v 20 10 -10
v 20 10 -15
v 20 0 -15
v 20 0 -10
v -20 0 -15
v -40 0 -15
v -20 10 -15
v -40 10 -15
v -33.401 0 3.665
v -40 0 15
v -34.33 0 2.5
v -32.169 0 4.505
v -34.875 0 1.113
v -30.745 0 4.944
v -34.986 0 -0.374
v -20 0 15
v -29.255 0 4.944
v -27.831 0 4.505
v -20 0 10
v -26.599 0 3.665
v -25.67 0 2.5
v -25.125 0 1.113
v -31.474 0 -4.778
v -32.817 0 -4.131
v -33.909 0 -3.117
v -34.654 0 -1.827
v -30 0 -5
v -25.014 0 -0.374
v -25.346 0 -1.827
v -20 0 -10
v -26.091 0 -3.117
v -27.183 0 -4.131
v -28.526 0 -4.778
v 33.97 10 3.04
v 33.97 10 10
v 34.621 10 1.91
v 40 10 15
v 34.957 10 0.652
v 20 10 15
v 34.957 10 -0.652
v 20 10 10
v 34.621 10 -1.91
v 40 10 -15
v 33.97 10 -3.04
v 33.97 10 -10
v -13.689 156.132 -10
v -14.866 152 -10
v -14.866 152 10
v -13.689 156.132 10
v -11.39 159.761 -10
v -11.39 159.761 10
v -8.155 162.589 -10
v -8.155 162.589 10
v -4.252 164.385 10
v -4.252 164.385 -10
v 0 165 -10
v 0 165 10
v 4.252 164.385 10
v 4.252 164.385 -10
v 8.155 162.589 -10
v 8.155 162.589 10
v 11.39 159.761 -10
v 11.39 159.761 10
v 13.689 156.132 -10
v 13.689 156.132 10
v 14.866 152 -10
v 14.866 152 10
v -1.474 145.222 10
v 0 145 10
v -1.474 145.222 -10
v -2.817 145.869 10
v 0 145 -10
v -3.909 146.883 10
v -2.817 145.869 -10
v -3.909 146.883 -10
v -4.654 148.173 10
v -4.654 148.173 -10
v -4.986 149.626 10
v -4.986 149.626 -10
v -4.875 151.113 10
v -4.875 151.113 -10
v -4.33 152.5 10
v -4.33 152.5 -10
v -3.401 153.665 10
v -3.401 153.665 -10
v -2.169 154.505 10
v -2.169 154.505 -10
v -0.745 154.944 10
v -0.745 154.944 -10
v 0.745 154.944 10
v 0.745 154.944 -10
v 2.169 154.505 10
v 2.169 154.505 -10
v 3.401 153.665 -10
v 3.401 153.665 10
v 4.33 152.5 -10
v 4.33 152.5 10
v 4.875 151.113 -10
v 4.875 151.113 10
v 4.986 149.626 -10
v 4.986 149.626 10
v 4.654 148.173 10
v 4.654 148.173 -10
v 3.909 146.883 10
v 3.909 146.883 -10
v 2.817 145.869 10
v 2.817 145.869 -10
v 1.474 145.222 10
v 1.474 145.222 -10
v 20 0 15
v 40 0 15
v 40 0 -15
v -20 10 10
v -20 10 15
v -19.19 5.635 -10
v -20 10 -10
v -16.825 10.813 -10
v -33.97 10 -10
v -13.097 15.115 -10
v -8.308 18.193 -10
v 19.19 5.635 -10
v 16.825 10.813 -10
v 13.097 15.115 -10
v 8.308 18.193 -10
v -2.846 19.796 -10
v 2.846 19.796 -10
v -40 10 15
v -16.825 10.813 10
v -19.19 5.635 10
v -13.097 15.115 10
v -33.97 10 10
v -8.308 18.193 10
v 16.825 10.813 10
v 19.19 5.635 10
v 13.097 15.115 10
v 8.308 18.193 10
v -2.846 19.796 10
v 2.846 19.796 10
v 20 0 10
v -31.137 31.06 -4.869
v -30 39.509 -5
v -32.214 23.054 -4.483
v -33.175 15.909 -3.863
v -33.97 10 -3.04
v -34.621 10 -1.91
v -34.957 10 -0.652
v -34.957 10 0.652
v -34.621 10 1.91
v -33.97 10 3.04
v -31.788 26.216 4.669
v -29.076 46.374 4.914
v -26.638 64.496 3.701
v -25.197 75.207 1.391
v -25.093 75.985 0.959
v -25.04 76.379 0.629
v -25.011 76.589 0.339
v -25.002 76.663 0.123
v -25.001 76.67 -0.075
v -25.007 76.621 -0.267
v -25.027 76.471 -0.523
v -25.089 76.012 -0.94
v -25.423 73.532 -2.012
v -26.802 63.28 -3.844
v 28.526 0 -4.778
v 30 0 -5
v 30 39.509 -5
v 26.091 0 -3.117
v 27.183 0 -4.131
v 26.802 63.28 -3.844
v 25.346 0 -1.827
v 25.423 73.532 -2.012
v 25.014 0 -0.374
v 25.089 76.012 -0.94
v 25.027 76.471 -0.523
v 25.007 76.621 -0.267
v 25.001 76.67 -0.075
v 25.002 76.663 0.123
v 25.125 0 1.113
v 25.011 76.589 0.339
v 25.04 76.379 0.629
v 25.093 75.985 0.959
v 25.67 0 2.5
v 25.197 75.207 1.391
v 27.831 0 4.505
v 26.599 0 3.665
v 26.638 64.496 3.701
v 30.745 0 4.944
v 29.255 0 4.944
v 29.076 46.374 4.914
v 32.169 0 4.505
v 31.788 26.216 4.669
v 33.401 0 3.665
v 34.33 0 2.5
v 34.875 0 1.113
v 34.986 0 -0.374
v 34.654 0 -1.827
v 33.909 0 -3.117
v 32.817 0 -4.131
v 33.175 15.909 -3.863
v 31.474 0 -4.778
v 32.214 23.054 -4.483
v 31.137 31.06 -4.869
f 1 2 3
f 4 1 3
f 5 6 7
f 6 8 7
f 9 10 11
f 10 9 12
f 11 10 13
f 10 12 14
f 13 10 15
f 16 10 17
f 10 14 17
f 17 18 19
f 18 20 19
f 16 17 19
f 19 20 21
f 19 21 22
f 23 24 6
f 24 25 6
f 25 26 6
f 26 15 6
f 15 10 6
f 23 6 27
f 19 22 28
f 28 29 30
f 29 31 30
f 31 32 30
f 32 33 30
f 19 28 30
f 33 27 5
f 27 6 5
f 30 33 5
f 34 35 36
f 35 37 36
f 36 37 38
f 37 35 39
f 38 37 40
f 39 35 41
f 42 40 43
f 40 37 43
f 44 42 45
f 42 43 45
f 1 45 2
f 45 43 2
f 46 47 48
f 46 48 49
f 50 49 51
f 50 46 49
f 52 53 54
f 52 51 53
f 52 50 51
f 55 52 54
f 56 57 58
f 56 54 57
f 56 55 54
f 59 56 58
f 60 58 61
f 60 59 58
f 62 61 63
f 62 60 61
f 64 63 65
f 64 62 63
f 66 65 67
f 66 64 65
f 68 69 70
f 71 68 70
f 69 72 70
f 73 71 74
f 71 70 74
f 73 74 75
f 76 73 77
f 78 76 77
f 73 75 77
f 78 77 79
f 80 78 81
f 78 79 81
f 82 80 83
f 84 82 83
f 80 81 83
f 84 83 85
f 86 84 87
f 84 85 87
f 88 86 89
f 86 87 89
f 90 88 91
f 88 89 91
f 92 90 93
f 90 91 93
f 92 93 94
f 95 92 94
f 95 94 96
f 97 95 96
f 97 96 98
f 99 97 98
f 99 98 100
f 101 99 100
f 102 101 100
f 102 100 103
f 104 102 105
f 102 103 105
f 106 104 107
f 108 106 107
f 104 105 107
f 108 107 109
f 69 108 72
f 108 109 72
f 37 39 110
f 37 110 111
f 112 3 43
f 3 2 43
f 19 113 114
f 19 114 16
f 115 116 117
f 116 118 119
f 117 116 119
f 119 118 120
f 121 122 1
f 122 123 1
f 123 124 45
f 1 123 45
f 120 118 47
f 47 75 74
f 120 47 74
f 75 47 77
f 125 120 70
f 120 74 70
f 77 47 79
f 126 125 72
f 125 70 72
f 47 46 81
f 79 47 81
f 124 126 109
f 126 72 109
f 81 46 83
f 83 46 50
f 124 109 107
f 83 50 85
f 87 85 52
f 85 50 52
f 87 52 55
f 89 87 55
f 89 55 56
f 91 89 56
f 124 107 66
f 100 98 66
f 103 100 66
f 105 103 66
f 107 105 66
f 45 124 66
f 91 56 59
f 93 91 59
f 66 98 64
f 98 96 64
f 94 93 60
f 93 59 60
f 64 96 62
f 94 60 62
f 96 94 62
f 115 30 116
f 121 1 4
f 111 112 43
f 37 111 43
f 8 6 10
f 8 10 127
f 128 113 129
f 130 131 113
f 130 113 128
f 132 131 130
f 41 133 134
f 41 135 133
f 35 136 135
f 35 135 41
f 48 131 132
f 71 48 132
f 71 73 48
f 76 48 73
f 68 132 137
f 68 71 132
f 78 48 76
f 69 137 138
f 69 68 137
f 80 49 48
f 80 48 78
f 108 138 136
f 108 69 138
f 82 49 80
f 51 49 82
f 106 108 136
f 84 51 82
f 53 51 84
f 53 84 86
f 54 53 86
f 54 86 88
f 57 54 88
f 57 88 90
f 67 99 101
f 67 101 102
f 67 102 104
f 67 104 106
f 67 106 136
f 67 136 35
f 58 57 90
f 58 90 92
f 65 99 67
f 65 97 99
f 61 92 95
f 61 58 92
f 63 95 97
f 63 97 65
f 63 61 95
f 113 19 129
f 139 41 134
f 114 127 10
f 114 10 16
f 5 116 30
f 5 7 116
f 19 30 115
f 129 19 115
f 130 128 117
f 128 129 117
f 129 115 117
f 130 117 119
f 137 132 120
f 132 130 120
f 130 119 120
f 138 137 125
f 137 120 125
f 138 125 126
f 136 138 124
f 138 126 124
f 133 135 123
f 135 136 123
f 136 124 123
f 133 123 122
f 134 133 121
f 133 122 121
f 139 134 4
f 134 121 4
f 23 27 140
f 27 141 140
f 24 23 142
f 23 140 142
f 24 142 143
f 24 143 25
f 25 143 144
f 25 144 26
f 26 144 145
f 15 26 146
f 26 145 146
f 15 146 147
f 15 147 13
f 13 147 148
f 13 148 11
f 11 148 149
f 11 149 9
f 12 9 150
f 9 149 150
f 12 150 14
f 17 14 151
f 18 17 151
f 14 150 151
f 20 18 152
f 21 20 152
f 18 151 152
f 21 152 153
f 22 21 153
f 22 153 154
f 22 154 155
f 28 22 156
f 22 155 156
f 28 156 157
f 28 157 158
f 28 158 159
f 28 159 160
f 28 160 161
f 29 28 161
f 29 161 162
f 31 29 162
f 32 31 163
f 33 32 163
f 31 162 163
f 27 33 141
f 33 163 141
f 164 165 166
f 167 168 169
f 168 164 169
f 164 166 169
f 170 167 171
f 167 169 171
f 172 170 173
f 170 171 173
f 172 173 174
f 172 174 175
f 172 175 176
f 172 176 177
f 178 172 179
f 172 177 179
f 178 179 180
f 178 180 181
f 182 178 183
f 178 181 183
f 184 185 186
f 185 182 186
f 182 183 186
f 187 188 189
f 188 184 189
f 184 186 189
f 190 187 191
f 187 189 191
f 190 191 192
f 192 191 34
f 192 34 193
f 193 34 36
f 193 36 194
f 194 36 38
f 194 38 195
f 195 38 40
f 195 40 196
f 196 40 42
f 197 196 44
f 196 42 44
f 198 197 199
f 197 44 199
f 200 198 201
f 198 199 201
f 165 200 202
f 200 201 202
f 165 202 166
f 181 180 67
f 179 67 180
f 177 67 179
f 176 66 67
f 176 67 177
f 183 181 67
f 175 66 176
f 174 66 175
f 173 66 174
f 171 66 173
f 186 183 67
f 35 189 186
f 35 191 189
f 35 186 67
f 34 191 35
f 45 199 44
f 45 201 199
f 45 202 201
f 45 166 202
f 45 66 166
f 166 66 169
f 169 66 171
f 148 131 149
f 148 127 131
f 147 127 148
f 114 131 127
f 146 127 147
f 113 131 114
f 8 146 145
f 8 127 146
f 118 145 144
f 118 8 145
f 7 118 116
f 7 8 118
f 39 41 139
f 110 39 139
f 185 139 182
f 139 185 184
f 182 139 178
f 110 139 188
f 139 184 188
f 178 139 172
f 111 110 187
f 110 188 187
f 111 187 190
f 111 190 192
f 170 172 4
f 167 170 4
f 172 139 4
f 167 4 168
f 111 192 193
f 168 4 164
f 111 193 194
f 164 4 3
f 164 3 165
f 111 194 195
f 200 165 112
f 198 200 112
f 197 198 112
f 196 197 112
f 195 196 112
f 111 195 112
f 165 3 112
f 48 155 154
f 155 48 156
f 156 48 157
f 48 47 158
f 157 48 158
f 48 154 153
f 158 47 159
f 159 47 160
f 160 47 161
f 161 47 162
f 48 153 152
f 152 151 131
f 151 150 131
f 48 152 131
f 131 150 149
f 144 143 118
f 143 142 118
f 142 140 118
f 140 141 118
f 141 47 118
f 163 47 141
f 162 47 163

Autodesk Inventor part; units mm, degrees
ref_plane "YZ Plane" through (0, 0, 0) normal (1, 0, 0) x (0, 1, 0)
ref_plane "XZ Plane" through (0, 0, 0) normal (0, 1, 0) x (-1, 0, 0)
ref_plane "XY Plane" through (0, 0, 0) normal (0, 0, 1) x (1, 0, 0)
sketch "草图1" plane through (0, 0, 0) normal (0, 0, 1) x (1, 0, 0)
  circle A0 centre (0, 0) radius 20 projected
  circle A1 centre (0, 0) radius 35
  line L0 (-35, 0) -> (35, 0)
  point P0 (-20, 0)
  point P1 (20, 0)
  dimension "d0" = 70
  dimension "d1" = 70
extrude "拉伸1" add sketch "草图1" along normal mid plane 20 contours A0 L0 A1 picked at (29.7075, 2.5961)
sketch "草图2" plane through (0, 0, 0) normal (0, 0, 1) x (1, 0, 0)
  arc A0 (20, 0) -> (-20, 0) centre (0, 0) ccw projected
  line L0 (-20, 0) -> (-40, 0)
  line L1 (-40, 0) -> (-40, 10)
  line L2 (-40, 10) -> (-20, 10)
  line L3 (-20, 10) -> (-20, 0)
  line L4 (35, 0) -> (20, 0) projected
  line L5 (20, 0) -> (40, 0)
  line L6 (40, 0) -> (40, 10)
  line L7 (40, 10) -> (20, 10)
  line L8 (20, 10) -> (20, 0)
  dimension "d4" = 20
  dimension "d5" = 10
  dimension "d6" = 20
  dimension "d7" = 10
extrude "拉伸2" add sketch "草图2" along normal mid plane 30
sketch "草图3" plane through (0, 0, 0) normal (0, 0, 1) x (1, 0, 0)
  circle A0 centre (0, 150) radius 15
  line L0 (-20, 10) -> (-33.541, 10) projected
  arc A1 (33.541, 10) -> (-33.541, 10) centre (0, 0) ccw projected
  line L1 (33.541, 10) -> (20, 10) projected
  line L2 (20, 10) -> (20, 0) projected
  arc A2 (20, 0) -> (-20, 0) centre (0, 0) ccw projected
  line L3 (-20, 0) -> (-20, 10) projected
  circle A3 centre (0, 0) radius 35
  line L4 (-14.8661, 152) -> (-34.6875, 4.6667)
  line L5 (0, 0) -> (0, 98.8257)
  line L6 (14.8661, 152) -> (34.6875, 4.6667)
  dimension "d10" = 30
  dimension "d11" = 150
extrude "拉伸3" add sketch "草图3" along normal mid plane 20 contours A0 | A0 L6 A3 A1 L4
sketch "草图4" plane through (0, 0, 10) normal (0, 0, 1) x (1, 0, 0)
  arc A0 (14.8661, 152) -> (-14.8661, 152) centre (0, 150) ccw projected
  point P0 (0, 0)
hole "孔1" at (0, 150, 10) direction (0, 0, -1) diameter 10 end through all
sketch "草图5" plane through (-40, 0, 15) normal (0, -1, 0) x (1, 0, 0)
  line L0 (20, -5) -> (20, 0) construction
  line L1 (0, 0) -> (20, 0) construction
  line L2 (0, -30) -> (0, 0) construction
  line L3 (20, -30) -> (0, -30) construction
  line L4 (20, -30) -> (20, -25) construction
  line L5 (20, -5) -> (20, -25) construction
  point P0 (40, -15)
  point P1 (10, -15)
  point P2 (0, -15)
  point P3 (10, -30)
hole "孔2" at (-30, 0, 0) direction (0, 1, 0) diameter 10 end through all
mirror "镜像1" about plane through (0, 0, 0) normal (1, 0, 0) of "孔2"
properties part number "连杆"
